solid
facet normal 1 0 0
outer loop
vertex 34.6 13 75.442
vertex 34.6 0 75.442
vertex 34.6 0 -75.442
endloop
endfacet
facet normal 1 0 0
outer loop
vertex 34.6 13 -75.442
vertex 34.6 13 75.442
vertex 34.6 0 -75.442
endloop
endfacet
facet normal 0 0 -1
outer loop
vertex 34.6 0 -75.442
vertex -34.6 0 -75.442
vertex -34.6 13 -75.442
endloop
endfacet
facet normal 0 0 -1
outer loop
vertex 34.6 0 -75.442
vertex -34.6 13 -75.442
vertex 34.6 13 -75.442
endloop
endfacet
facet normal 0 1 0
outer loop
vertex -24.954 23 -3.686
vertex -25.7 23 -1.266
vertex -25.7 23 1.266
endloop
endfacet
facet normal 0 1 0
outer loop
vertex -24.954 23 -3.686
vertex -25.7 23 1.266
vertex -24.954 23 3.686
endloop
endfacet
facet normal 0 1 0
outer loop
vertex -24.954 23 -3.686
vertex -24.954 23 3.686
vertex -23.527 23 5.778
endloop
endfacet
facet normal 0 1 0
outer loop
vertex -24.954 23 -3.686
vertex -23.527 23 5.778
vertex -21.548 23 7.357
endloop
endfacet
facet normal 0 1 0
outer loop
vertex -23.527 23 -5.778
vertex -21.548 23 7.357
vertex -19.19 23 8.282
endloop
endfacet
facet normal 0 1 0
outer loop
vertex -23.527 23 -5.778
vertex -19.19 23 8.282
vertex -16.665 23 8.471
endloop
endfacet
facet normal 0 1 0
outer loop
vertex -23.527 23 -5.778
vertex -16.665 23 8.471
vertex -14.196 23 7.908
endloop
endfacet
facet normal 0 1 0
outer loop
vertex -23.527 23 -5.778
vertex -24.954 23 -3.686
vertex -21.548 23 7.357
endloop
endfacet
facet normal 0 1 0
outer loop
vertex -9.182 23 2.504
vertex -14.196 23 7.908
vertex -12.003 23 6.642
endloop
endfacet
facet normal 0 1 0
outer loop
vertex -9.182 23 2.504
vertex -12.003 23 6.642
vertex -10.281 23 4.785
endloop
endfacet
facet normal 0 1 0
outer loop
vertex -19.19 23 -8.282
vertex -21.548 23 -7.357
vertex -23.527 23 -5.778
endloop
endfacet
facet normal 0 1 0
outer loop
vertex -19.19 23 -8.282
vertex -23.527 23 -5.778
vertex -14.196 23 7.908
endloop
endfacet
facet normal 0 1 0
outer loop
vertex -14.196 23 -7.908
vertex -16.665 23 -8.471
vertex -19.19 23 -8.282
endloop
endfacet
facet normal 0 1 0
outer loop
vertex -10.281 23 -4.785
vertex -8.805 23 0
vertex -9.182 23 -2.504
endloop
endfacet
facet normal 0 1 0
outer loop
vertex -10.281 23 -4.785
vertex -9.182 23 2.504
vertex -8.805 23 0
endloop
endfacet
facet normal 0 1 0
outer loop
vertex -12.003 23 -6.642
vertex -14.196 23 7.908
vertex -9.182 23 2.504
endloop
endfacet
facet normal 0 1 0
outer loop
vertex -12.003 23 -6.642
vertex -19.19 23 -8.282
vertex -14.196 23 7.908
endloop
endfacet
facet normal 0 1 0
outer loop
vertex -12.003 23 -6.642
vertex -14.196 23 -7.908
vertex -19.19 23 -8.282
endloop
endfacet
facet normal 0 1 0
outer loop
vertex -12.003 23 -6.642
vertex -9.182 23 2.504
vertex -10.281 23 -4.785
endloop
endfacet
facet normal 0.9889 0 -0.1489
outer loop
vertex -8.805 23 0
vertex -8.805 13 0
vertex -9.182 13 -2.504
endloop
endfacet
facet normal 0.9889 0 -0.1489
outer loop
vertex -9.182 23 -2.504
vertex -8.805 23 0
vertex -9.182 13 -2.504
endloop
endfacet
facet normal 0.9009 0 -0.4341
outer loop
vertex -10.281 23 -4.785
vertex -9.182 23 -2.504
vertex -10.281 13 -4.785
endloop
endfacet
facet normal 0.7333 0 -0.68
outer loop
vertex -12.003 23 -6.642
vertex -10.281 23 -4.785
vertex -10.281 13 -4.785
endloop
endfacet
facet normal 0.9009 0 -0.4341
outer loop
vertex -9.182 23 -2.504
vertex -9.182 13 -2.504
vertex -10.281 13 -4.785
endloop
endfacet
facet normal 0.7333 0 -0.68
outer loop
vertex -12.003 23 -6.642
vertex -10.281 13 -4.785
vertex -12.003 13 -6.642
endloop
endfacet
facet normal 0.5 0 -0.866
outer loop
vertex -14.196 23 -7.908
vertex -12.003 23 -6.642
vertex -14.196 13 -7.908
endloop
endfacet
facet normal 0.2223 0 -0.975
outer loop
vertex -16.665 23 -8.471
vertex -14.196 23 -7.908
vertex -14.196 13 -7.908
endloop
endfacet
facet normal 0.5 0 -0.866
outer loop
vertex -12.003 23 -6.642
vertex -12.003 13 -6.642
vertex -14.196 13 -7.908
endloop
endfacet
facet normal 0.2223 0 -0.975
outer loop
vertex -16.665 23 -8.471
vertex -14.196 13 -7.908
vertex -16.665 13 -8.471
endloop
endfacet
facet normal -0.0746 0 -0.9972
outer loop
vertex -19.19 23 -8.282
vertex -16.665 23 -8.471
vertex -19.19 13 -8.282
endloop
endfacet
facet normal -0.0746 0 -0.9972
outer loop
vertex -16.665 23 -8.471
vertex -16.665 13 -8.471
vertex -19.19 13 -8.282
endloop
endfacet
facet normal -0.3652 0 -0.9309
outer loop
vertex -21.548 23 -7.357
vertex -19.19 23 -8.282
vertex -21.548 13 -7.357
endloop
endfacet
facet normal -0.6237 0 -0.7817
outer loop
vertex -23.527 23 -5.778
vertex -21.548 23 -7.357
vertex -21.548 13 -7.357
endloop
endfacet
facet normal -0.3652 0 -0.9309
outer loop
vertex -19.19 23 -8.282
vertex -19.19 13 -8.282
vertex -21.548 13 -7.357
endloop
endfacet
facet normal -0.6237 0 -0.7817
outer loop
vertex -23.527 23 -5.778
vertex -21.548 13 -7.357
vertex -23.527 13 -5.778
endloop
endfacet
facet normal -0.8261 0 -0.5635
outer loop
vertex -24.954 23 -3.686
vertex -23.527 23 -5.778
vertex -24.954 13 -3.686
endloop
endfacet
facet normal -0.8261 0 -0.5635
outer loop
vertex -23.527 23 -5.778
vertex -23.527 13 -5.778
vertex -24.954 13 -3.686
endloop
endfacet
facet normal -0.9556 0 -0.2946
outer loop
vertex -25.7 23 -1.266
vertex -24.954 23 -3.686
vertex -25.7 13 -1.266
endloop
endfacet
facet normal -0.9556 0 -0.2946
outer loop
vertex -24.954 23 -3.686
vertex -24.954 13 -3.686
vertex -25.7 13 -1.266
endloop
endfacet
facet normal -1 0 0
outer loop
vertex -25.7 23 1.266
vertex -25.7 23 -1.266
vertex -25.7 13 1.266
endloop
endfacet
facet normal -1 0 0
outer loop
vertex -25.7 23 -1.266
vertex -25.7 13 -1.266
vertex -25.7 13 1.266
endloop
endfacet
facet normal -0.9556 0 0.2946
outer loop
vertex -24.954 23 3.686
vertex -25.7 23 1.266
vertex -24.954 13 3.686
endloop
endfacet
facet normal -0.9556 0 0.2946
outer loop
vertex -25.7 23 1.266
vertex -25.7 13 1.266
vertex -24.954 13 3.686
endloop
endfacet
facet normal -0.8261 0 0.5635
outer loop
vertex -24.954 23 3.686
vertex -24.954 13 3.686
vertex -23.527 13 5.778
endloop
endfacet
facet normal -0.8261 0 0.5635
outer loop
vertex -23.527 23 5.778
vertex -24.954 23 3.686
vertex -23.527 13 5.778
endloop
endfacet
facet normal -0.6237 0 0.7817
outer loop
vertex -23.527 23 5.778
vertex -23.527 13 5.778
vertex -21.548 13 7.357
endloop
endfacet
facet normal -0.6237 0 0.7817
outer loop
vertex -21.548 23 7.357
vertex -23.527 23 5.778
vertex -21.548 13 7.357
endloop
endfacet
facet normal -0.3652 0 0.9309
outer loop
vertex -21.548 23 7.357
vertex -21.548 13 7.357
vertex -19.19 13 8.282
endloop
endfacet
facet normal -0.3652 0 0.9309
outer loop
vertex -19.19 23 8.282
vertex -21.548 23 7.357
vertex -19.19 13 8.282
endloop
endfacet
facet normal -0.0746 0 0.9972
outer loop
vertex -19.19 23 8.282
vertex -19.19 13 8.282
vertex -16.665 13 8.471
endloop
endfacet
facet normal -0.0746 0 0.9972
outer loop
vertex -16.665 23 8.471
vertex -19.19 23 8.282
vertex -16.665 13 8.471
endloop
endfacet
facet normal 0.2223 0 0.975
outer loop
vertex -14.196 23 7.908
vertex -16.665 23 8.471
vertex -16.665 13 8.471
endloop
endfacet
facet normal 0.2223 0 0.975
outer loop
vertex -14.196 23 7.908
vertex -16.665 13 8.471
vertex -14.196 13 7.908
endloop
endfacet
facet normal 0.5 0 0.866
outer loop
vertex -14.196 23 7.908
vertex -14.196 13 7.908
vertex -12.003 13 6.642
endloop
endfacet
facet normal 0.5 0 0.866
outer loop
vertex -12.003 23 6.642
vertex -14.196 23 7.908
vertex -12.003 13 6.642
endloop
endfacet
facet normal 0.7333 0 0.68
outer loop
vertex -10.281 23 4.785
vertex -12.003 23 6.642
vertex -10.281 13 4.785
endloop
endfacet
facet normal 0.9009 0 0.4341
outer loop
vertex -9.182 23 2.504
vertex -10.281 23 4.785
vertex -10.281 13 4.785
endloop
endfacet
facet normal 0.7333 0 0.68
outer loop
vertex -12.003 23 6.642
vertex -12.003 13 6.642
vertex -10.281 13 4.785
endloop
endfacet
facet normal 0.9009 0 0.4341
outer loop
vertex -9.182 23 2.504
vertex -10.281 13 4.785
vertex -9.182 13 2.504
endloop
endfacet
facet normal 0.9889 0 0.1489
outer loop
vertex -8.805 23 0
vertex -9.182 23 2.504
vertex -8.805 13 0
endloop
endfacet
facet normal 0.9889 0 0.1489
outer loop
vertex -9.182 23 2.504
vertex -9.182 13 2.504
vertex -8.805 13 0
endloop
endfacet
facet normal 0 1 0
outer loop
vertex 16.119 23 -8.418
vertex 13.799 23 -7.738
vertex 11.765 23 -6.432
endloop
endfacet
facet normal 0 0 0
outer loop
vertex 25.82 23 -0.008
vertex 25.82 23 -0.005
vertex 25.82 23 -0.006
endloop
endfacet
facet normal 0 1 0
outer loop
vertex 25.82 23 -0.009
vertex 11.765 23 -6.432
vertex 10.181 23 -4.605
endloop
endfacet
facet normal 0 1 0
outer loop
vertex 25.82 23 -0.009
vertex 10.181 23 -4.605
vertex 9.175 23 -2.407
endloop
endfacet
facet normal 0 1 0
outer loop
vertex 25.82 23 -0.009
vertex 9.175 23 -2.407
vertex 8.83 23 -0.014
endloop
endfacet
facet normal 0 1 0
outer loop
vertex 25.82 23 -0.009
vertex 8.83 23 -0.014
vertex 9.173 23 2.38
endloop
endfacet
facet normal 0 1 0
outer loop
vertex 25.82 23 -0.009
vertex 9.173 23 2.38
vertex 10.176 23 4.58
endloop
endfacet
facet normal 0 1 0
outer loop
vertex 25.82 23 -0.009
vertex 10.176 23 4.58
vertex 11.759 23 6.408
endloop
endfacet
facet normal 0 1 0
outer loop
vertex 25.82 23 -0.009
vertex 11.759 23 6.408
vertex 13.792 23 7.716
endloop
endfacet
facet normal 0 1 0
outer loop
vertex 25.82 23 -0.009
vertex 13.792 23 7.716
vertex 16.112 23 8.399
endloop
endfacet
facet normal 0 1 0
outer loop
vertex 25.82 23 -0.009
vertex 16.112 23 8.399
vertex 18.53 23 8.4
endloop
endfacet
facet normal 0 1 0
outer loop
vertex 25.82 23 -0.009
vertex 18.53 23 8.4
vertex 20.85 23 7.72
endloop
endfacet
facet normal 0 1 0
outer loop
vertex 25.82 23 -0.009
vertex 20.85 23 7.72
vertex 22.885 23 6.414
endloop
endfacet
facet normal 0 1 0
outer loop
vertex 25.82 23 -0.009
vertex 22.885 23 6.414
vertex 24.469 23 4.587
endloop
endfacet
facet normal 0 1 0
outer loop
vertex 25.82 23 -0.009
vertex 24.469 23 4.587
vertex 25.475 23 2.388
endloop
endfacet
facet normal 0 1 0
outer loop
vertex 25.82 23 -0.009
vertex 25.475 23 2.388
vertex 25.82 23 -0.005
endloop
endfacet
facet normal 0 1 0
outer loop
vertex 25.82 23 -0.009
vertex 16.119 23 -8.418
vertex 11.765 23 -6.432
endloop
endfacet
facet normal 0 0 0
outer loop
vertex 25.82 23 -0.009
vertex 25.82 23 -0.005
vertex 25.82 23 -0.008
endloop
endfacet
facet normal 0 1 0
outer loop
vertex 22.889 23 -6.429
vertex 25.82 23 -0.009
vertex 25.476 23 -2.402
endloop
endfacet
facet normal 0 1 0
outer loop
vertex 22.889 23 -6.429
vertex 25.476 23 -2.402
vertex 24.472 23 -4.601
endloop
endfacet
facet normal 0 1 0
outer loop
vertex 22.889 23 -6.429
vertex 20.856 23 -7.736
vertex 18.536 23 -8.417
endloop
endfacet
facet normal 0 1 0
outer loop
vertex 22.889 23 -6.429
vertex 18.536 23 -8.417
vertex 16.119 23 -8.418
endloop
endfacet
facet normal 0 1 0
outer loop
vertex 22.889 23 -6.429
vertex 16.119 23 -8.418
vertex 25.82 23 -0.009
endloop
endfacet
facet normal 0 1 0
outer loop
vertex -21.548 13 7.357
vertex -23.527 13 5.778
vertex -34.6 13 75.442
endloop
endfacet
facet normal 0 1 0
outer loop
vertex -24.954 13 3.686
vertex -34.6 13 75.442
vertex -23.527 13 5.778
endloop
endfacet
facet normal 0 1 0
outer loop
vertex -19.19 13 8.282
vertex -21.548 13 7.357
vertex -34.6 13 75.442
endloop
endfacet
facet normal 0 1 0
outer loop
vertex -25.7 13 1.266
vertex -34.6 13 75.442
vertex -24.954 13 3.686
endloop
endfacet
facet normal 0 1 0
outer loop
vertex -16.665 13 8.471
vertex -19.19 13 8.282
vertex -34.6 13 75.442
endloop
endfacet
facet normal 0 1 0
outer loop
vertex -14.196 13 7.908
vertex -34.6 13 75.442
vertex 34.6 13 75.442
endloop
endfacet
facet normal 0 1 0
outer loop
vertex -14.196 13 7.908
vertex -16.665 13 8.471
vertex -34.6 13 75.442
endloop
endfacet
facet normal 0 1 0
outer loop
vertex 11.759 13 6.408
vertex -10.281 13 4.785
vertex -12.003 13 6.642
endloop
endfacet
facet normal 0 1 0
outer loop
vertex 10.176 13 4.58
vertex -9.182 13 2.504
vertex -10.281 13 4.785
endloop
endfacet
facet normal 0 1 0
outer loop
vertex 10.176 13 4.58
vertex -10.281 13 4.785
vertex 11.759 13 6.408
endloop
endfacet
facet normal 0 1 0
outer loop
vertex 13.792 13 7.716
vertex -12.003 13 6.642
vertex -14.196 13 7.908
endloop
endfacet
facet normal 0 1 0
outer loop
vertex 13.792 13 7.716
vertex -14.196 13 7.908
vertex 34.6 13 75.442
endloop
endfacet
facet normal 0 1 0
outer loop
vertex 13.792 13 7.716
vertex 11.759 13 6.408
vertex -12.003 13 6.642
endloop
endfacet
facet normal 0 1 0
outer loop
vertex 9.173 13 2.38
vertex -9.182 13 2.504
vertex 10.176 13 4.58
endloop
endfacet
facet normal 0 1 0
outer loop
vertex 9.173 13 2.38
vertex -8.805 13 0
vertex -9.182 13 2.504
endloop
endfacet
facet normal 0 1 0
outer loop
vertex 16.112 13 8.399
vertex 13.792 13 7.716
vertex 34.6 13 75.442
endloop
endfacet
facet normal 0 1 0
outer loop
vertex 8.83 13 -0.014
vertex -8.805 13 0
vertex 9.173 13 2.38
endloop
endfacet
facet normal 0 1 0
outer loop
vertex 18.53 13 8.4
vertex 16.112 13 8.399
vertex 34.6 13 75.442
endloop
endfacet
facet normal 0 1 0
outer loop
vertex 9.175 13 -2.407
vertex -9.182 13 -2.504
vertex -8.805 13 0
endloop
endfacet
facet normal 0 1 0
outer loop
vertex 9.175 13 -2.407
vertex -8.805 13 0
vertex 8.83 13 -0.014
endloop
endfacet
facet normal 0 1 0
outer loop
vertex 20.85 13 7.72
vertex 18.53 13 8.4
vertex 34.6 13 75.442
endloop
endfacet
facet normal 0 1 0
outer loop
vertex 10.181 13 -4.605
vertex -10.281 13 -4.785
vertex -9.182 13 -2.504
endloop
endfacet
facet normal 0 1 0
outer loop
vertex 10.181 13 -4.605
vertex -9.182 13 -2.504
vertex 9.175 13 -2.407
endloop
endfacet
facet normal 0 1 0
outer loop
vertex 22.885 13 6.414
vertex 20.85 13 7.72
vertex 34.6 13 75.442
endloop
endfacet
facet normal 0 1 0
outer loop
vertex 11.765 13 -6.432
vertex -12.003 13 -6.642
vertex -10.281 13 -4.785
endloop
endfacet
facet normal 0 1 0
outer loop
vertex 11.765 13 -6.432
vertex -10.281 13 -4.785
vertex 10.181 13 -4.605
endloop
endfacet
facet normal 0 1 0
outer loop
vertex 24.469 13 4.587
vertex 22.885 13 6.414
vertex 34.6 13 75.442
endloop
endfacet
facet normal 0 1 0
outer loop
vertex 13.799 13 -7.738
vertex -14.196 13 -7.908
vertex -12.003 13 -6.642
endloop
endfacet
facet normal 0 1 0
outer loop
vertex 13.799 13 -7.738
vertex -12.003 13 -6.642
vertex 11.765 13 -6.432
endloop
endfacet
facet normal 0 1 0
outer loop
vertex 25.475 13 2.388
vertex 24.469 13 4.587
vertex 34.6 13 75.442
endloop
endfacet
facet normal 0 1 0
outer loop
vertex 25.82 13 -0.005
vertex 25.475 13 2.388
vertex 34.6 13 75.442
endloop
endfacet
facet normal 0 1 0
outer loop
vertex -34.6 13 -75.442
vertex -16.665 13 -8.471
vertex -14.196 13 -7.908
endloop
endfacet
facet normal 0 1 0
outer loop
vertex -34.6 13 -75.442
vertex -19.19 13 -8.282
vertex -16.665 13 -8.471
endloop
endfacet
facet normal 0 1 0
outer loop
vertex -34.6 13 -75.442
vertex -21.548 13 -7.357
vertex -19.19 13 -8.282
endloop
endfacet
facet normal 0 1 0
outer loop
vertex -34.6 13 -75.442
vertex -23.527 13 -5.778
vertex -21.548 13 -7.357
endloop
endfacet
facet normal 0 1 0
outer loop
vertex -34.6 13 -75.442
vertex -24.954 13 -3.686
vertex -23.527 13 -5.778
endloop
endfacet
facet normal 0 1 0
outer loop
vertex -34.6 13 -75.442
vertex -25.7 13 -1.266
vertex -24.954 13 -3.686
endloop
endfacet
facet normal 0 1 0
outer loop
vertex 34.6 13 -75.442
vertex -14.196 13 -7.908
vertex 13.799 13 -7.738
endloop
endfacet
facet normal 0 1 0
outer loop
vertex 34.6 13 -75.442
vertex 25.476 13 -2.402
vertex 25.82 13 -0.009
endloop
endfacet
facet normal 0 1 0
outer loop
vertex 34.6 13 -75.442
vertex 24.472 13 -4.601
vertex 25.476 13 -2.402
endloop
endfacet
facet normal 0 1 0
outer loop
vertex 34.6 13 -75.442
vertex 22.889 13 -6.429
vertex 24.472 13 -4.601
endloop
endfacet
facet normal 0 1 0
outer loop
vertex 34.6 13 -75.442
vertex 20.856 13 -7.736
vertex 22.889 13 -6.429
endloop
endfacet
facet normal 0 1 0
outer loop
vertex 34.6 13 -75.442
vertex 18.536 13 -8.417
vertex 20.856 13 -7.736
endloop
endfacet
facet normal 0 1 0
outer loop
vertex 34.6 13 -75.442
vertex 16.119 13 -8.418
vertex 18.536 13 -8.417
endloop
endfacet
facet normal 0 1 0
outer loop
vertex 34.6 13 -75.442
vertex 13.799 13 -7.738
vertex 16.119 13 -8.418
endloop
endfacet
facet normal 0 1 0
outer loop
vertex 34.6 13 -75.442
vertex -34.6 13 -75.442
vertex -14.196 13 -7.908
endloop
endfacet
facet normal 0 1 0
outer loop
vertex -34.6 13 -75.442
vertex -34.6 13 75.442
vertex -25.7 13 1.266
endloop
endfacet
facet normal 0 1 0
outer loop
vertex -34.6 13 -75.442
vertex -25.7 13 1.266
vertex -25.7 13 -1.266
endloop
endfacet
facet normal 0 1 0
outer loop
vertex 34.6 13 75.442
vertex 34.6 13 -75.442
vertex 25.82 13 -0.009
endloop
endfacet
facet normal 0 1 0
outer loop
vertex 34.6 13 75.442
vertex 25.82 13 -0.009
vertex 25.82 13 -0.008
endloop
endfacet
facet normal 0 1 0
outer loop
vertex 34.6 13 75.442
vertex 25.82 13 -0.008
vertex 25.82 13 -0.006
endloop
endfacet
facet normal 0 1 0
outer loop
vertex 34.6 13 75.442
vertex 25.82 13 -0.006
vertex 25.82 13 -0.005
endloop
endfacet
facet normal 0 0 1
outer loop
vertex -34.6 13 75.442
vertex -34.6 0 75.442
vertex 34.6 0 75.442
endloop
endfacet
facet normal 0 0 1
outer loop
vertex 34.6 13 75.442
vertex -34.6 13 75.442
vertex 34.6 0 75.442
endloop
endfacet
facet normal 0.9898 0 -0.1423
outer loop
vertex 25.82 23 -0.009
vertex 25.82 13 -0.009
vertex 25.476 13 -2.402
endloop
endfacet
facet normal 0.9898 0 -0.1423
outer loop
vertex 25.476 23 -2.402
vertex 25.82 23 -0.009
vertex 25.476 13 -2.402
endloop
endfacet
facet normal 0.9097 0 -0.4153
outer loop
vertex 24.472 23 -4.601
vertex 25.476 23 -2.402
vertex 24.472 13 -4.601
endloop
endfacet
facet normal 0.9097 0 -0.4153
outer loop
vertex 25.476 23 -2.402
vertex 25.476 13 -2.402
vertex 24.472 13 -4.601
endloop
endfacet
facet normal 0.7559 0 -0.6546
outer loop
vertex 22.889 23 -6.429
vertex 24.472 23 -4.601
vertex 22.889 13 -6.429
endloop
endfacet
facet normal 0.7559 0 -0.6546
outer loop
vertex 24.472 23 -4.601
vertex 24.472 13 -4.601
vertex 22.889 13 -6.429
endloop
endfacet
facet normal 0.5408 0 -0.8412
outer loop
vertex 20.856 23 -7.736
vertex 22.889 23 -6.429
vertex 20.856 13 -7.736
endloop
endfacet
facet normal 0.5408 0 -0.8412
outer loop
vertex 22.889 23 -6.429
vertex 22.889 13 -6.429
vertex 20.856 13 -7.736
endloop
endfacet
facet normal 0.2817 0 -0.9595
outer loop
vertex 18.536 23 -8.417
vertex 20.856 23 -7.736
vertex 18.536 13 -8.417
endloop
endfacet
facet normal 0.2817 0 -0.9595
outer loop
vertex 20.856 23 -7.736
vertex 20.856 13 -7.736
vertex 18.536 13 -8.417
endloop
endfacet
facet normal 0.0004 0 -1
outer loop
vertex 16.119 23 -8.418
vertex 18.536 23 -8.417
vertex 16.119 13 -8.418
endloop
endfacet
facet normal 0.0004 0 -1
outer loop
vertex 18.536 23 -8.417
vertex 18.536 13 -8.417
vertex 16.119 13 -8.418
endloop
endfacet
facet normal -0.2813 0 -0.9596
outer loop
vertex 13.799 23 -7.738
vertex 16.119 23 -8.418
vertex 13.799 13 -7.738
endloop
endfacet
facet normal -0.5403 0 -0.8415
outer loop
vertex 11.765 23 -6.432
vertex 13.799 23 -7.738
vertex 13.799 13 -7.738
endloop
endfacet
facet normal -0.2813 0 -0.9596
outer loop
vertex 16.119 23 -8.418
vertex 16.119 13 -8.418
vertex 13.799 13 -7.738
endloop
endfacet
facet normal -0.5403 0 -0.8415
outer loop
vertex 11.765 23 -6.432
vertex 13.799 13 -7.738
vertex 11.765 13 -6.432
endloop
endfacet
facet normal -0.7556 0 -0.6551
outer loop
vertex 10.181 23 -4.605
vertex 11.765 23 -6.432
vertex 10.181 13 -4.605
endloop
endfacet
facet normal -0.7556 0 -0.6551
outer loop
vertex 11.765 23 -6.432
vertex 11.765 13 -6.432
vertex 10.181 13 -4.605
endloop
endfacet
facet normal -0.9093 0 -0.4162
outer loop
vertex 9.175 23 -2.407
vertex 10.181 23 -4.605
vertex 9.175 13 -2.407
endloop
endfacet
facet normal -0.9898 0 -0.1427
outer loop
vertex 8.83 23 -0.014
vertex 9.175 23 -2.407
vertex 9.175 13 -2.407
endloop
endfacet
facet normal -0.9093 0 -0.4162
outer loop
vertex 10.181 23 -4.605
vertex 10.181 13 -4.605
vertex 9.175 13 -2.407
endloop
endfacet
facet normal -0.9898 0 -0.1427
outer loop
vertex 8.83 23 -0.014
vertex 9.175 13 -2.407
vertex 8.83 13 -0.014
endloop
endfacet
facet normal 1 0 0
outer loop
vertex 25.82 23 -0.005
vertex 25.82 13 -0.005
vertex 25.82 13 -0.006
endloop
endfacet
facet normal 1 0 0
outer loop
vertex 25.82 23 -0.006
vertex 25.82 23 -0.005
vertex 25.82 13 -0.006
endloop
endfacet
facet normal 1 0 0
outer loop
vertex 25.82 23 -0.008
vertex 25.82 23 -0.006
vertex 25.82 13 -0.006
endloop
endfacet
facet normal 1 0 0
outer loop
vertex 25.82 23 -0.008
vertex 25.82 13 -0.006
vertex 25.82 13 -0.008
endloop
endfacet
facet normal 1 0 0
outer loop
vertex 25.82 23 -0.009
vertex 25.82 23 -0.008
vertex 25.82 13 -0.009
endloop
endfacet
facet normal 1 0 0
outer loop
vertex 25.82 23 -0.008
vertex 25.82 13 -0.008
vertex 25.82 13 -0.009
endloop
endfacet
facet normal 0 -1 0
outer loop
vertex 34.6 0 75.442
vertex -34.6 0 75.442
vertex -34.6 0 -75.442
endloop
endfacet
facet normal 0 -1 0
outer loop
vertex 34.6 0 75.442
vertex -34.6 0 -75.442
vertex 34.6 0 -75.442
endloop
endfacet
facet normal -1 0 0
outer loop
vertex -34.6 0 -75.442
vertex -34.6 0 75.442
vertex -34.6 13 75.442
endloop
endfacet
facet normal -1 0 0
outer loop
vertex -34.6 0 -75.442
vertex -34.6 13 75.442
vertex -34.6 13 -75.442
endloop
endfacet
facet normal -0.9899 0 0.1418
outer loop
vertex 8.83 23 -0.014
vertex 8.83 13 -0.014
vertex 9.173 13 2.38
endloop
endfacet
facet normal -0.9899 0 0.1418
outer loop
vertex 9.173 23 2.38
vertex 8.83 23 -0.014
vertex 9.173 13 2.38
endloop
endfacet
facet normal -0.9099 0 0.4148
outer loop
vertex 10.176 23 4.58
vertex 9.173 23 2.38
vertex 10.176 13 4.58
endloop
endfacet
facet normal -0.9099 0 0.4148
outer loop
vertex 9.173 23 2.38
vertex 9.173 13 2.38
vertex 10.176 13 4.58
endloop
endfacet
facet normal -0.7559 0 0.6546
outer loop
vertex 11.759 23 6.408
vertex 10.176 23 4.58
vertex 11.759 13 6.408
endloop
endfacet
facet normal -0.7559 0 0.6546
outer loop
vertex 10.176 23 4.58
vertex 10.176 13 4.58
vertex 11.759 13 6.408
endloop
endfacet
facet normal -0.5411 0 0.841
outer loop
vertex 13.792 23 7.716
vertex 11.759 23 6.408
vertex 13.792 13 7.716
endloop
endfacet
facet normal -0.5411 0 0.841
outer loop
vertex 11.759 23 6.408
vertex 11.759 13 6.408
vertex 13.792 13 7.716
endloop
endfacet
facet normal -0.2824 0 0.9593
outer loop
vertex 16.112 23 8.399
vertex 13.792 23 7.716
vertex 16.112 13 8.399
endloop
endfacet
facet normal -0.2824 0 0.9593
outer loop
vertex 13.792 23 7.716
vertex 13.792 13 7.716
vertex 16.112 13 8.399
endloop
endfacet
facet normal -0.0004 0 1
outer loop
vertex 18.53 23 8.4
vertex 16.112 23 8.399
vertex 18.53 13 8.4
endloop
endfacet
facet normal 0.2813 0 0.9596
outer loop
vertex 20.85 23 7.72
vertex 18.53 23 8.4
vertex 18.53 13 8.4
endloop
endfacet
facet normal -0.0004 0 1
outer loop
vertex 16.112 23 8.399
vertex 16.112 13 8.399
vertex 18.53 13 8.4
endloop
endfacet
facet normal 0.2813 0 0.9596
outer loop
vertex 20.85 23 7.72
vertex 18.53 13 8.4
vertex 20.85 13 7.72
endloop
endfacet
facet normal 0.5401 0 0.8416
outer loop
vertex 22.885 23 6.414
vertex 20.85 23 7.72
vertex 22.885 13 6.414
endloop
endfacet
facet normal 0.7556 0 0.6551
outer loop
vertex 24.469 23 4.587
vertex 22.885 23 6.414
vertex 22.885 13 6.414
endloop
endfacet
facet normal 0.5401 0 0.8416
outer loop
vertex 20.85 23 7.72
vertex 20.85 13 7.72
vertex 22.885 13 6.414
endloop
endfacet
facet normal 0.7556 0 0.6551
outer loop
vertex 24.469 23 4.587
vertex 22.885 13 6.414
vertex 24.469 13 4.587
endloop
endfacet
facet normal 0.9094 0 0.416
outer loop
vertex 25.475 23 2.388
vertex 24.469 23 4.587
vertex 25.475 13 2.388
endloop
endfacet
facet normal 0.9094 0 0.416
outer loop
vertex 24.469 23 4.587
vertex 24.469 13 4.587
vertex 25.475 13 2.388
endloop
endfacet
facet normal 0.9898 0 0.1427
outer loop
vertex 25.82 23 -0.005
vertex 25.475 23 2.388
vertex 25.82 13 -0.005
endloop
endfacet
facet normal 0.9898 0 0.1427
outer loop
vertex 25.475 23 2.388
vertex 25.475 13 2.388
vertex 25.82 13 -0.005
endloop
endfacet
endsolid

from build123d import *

# Parameters (mm, degrees)
SKETCH1_W           = 69.2
SKETCH1_H           = 150.88406761
BOSS_EXTRUDE1_DEPTH = 13
BOSS_EXTRUDE2_DEPTH = 10


with BuildPart() as part:
    # Sketch1 → Boss-Extrude1 (new body)
    with BuildSketch(Plane(origin=(0, 0, 0), x_dir=(1, 0, 0), z_dir=(0, 1, 0))):
        Rectangle(SKETCH1_W, SKETCH1_H)
    extrude(amount=BOSS_EXTRUDE1_DEPTH)

    # Sketch2 → Boss-Extrude2 (add)
    with BuildSketch(Plane(origin=(0, 13, 0), x_dir=(1, 0, 0), z_dir=(0, 1, 0))):
        with BuildLine():
            ThreePointArc((-25.795, 0), (-17.3, -8.495), (-8.805, 0))
            Line((-8.805, 0), (-25.795, 0))
        make_face()
        with BuildLine():
            Line((-25.795, 0), (-8.805, 0))
            ThreePointArc((-8.805, 0), (-17.3, 8.495), (-25.795, 0))
        make_face()
        with BuildLine():
            ThreePointArc((25.820118221, 0.00925204), (17.327393087, 8.504251736), (8.83011944, 0.013801772))
            Line((8.83011944, 0.013801772), (25.820117003, 0.004702309))
            ThreePointArc((25.820117003, 0.004702309), (25.820117917, 0.006977175), (25.820118221, 0.00925204))
        make_face()
        with BuildLine():
            Line((25.820117003, 0.004702309), (8.83011944, 0.013801772))
            ThreePointArc((8.83011944, 0.013801772), (17.32056849, -8.485746741), (25.820117003, 0.004702309))
        make_face()
    extrude(amount=BOSS_EXTRUDE2_DEPTH)


solid = part.part
